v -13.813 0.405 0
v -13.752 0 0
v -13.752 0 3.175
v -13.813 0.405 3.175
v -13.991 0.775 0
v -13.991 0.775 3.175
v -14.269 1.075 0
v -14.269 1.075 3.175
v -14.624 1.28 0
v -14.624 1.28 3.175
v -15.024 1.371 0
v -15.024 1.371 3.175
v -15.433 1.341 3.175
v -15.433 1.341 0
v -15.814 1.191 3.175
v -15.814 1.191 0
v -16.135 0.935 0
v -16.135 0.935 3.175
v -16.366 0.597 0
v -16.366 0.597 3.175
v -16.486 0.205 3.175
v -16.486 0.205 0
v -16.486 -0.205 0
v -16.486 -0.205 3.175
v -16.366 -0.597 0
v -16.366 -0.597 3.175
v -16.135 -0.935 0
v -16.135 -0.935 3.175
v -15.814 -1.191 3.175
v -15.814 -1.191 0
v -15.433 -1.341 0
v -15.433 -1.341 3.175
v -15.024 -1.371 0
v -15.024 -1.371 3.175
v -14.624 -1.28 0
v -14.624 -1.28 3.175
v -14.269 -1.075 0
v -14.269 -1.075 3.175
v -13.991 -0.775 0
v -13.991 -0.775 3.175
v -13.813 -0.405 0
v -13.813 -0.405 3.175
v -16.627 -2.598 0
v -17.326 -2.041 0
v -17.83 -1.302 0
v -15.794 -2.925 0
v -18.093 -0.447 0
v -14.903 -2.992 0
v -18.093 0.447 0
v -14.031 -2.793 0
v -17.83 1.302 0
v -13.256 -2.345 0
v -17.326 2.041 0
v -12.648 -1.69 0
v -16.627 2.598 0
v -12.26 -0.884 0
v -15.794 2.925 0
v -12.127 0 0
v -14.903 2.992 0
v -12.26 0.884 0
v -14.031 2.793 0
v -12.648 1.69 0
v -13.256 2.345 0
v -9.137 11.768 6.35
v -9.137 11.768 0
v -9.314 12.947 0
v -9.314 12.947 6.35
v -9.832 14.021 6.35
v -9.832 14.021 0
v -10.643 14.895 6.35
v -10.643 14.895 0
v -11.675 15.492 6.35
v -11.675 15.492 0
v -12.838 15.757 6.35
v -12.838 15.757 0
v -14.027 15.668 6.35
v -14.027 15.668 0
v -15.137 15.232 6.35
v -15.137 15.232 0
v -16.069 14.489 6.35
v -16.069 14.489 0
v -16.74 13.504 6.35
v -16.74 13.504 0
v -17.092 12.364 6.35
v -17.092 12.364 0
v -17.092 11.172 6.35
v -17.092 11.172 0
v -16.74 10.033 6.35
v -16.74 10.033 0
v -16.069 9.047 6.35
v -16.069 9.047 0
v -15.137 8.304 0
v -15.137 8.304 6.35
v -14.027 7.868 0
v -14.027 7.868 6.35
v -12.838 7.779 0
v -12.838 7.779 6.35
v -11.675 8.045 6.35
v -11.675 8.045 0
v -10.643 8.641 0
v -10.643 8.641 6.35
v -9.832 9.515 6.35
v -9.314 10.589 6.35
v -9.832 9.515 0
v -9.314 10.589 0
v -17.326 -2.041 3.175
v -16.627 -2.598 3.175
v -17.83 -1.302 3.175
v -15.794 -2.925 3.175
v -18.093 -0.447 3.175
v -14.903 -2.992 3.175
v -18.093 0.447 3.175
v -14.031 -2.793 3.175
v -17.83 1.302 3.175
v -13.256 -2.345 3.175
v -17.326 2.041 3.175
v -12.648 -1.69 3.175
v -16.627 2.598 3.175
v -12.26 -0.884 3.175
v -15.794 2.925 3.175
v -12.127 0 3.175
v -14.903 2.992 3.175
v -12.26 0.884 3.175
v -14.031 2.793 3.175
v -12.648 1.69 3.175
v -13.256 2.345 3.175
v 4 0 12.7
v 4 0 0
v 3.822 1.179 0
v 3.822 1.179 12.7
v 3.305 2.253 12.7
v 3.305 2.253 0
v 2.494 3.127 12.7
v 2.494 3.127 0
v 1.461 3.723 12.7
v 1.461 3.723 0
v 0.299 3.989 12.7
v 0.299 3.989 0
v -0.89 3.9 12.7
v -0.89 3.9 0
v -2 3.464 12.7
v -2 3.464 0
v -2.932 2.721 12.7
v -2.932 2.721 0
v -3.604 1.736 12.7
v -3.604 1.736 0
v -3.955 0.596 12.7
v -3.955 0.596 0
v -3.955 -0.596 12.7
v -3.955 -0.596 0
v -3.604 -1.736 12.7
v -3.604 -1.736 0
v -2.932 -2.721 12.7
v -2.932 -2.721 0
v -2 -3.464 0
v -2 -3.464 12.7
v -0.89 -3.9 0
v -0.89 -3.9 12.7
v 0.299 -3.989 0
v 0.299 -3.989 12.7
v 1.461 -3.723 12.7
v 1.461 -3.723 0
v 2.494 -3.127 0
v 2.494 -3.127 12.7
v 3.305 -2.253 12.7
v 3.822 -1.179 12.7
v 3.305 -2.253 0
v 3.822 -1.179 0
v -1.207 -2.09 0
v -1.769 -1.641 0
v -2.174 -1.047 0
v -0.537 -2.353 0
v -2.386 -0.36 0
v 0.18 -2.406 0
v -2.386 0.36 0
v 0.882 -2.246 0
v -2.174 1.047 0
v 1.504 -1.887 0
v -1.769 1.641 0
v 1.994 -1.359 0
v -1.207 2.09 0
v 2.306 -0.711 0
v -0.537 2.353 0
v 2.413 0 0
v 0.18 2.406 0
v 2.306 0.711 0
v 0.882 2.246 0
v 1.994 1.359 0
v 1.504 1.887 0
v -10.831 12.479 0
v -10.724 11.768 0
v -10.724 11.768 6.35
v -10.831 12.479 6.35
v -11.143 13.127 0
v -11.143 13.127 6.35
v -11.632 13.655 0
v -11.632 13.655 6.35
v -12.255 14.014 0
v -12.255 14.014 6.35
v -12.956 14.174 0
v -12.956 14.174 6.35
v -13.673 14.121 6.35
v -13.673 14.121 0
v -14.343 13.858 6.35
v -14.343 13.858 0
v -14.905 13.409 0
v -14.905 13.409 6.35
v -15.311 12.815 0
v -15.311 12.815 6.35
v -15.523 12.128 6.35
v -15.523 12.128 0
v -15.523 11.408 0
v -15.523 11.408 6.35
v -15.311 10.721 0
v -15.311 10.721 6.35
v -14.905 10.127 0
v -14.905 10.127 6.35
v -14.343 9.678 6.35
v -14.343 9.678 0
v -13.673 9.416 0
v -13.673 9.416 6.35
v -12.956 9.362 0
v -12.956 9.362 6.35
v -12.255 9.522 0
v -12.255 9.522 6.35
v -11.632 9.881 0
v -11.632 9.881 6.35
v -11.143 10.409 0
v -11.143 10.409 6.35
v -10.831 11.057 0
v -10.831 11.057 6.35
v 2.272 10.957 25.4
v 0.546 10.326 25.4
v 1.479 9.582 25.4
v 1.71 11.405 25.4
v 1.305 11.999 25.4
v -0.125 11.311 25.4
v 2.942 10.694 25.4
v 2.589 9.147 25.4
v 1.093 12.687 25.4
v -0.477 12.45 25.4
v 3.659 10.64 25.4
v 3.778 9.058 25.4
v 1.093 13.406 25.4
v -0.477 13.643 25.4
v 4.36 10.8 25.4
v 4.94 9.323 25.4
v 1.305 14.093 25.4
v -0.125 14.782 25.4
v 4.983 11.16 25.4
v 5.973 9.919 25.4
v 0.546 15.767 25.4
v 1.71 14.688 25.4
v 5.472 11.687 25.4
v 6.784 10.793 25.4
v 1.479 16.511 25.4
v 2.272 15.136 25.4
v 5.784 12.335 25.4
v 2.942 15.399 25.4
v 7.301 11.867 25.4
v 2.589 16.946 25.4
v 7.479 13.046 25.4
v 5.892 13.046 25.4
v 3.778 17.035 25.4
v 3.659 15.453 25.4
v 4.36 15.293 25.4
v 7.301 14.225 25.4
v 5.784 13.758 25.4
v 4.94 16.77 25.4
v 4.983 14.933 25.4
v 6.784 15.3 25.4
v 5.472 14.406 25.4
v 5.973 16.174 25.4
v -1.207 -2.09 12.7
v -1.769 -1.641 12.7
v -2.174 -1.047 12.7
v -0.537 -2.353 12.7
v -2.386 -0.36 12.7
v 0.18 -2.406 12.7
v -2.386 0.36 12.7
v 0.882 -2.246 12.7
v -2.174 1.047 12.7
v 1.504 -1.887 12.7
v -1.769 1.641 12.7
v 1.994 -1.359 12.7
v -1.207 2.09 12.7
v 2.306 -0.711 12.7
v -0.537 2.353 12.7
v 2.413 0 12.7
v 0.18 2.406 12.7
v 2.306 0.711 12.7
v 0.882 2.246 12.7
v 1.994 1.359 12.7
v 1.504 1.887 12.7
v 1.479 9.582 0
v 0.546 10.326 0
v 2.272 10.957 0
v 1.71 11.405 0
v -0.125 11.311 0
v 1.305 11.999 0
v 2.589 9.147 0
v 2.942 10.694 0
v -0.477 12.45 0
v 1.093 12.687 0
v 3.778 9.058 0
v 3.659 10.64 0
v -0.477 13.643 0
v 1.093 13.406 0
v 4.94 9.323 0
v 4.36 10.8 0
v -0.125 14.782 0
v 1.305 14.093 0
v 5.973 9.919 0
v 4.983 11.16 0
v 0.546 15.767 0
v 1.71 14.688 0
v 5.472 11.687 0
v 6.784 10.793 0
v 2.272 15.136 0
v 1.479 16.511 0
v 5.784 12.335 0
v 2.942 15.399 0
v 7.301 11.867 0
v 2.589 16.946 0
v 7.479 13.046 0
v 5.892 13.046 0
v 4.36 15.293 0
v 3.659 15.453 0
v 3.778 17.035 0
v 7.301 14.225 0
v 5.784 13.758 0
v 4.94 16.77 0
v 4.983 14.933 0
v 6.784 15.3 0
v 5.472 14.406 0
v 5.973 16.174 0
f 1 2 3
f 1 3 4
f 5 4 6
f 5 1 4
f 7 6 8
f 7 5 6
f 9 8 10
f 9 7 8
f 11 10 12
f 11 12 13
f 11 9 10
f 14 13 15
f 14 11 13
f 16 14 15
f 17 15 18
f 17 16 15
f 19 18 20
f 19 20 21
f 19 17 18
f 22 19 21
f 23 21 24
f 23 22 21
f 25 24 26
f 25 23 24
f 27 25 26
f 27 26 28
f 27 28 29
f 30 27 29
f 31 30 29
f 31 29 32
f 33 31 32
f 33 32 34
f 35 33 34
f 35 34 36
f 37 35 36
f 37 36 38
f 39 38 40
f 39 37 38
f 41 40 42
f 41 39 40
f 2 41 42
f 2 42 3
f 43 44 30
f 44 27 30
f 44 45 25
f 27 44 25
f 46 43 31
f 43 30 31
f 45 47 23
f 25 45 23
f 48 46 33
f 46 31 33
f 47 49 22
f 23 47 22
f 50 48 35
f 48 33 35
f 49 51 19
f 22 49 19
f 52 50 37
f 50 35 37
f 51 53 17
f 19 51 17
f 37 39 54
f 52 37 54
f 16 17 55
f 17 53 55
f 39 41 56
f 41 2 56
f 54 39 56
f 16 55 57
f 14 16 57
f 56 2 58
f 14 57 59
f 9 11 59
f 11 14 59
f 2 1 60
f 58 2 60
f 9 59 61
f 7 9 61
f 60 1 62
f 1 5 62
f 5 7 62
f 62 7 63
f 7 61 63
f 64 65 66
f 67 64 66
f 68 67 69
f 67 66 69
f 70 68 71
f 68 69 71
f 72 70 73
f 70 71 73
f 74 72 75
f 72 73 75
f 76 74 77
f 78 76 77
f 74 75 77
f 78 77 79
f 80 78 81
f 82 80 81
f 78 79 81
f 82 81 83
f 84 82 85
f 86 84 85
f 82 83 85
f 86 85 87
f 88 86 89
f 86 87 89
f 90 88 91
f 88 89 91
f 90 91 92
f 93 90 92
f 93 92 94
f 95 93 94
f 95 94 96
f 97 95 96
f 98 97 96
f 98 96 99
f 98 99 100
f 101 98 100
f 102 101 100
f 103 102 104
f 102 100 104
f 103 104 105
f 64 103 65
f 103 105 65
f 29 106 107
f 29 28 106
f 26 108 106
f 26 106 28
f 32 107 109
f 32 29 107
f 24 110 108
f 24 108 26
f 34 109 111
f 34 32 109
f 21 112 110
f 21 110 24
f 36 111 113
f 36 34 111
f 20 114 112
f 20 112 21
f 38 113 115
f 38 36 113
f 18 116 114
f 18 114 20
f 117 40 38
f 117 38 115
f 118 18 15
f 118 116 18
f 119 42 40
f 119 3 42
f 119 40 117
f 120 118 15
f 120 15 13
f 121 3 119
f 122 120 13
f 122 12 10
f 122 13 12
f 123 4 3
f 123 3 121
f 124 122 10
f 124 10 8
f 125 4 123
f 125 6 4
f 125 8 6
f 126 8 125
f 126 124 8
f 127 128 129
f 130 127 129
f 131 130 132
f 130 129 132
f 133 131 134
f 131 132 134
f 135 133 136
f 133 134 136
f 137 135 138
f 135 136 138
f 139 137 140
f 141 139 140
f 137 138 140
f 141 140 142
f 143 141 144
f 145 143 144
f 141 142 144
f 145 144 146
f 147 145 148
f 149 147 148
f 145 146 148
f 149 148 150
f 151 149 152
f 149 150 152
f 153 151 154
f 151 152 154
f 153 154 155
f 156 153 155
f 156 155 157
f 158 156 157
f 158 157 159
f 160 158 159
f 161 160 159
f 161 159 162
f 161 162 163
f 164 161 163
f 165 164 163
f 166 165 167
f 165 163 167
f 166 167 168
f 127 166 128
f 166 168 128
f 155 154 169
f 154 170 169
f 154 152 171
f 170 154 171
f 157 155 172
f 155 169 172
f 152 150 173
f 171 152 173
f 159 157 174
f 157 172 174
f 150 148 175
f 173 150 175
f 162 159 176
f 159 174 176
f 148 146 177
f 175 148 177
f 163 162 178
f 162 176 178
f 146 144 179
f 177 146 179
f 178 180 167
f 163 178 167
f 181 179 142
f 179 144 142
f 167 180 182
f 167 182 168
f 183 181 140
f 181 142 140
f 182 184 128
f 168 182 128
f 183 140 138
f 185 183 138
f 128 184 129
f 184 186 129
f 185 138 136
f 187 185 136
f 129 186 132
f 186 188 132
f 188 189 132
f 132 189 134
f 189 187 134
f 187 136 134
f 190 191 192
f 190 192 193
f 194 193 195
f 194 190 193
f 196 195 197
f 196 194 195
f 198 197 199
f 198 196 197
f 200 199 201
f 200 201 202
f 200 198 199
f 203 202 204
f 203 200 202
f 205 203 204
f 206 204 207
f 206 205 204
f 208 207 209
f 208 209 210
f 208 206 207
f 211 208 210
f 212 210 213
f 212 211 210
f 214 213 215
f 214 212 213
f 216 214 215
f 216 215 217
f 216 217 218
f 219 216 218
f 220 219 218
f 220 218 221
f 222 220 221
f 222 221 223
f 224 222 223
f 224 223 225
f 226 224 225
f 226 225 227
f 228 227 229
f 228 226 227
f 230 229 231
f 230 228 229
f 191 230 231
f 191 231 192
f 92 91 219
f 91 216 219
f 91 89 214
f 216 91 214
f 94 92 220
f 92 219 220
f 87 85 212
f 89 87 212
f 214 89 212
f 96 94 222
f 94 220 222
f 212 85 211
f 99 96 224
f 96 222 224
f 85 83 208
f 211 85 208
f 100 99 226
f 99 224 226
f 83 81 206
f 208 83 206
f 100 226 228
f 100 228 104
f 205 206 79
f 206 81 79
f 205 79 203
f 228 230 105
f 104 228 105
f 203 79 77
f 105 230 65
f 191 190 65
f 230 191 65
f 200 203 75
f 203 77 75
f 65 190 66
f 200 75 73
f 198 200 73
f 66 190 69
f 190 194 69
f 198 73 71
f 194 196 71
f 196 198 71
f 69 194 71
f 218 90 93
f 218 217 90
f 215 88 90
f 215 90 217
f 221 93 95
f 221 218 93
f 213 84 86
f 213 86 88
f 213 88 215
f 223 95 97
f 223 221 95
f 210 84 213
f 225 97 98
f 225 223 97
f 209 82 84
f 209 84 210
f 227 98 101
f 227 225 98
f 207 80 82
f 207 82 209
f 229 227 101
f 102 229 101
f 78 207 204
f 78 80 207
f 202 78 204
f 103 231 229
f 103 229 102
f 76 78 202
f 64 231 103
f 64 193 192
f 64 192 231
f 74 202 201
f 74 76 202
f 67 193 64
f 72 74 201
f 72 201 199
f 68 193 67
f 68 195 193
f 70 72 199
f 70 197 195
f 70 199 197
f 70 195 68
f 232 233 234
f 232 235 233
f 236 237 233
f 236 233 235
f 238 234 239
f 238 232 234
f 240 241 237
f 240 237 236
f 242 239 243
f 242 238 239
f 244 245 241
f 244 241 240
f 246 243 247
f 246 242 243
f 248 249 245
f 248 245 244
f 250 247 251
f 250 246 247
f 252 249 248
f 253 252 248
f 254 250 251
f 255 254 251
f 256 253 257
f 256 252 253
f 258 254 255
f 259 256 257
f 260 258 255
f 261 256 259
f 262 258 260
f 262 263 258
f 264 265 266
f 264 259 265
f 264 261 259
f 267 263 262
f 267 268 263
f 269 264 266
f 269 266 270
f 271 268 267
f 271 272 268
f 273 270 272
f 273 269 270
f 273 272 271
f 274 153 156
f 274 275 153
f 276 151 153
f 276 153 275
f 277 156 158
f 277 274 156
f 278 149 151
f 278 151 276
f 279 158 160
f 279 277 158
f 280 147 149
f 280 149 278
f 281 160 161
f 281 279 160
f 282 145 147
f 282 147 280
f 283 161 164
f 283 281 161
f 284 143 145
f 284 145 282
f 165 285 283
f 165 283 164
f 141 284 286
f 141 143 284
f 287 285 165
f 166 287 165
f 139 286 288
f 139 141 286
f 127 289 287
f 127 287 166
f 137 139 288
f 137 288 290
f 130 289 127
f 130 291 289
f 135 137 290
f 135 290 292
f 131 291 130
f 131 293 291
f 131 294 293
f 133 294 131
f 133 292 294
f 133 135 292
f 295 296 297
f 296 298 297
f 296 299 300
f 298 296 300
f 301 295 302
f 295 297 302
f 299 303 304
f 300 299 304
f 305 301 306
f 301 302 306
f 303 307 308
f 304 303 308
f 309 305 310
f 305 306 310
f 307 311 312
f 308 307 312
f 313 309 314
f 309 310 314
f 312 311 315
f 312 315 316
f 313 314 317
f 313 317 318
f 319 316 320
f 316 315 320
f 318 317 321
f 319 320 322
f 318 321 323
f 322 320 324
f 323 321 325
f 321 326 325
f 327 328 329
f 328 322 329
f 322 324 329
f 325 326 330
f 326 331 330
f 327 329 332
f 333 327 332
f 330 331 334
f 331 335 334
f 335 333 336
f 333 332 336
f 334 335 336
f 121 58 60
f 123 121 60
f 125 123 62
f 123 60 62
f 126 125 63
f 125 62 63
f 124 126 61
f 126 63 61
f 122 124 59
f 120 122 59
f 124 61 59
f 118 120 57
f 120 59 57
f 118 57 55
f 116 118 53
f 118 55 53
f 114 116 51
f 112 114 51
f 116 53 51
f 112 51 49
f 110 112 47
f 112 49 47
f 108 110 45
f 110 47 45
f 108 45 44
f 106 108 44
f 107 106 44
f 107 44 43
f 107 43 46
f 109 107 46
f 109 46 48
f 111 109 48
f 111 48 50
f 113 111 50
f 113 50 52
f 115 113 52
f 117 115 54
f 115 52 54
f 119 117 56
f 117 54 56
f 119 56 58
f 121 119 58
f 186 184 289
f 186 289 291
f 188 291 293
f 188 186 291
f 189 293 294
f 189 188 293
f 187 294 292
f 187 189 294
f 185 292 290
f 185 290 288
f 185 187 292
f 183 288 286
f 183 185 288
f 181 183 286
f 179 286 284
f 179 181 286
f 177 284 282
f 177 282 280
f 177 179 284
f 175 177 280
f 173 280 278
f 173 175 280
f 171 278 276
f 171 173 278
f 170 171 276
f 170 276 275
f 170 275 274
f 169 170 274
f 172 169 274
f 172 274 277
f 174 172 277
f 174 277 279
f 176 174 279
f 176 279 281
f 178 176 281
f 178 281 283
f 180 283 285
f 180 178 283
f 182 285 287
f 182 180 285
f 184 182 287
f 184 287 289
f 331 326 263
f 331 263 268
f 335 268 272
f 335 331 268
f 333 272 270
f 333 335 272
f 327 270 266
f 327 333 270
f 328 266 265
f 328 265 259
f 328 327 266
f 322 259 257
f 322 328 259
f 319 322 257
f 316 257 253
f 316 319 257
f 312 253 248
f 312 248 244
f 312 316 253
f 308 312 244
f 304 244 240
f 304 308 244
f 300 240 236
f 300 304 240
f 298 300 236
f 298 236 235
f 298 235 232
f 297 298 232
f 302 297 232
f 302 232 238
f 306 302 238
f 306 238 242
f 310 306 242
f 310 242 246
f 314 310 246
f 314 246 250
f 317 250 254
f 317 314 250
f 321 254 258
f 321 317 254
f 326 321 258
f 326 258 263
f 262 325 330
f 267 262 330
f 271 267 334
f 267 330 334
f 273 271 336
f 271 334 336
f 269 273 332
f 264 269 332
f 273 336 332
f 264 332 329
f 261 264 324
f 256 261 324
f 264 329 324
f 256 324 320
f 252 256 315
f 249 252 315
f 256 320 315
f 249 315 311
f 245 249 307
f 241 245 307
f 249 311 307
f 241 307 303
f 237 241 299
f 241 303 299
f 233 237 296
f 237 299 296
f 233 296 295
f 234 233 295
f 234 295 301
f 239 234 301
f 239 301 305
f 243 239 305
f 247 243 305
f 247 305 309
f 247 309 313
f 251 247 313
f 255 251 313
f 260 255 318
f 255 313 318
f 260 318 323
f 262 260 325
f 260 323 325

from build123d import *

# Parameters (mm, degrees)
F0_R     = 4
F0_R_2   = 2.413
F4_DEPTH = 25.4
F1_R     = 4
F1_R_2   = 2.413
F5_DEPTH = 12.7
F2_R     = 4
F2_R_2   = 2.413
F6_DEPTH = 6.35
F3_R     = 3
F3_R_2   = 1.375
F7_DEPTH = 3.175


with BuildPart() as f4:
    # F0 (on Top) → F4 (new body)
    with BuildSketch(Plane.XY):
        with Locations((3.478641, 13.046432)):
            Circle(F0_R)
        with Locations((3.478641, 13.046432)):
            Circle(F0_R_2, mode=Mode.SUBTRACT)
    extrude(amount=F4_DEPTH)


with BuildPart() as f5:
    # F1 (on Top) → F5 (new body)
    with BuildSketch(Plane.XY):
        Circle(F1_R)
        Circle(F1_R_2, mode=Mode.SUBTRACT)
    extrude(amount=F5_DEPTH)


with BuildPart() as f6:
    # F2 (on Top) → F6 (new body)
    with BuildSketch(Plane.XY):
        with Locations((-13.136519, 11.768044)):
            Circle(F2_R)
        with Locations((-13.136519, 11.768044)):
            Circle(F2_R_2, mode=Mode.SUBTRACT)
    extrude(amount=F6_DEPTH)


with BuildPart() as f7:
    # F3 (on Top) → F7 (new body)
    with BuildSketch(Plane.XY):
        with Locations((-15.126723, 0)):
            Circle(F3_R)
        with Locations((-15.126723, 0)):
            Circle(F3_R_2, mode=Mode.SUBTRACT)
    extrude(amount=F7_DEPTH)


solid = Compound([f4.part, f5.part, f6.part, f7.part])
